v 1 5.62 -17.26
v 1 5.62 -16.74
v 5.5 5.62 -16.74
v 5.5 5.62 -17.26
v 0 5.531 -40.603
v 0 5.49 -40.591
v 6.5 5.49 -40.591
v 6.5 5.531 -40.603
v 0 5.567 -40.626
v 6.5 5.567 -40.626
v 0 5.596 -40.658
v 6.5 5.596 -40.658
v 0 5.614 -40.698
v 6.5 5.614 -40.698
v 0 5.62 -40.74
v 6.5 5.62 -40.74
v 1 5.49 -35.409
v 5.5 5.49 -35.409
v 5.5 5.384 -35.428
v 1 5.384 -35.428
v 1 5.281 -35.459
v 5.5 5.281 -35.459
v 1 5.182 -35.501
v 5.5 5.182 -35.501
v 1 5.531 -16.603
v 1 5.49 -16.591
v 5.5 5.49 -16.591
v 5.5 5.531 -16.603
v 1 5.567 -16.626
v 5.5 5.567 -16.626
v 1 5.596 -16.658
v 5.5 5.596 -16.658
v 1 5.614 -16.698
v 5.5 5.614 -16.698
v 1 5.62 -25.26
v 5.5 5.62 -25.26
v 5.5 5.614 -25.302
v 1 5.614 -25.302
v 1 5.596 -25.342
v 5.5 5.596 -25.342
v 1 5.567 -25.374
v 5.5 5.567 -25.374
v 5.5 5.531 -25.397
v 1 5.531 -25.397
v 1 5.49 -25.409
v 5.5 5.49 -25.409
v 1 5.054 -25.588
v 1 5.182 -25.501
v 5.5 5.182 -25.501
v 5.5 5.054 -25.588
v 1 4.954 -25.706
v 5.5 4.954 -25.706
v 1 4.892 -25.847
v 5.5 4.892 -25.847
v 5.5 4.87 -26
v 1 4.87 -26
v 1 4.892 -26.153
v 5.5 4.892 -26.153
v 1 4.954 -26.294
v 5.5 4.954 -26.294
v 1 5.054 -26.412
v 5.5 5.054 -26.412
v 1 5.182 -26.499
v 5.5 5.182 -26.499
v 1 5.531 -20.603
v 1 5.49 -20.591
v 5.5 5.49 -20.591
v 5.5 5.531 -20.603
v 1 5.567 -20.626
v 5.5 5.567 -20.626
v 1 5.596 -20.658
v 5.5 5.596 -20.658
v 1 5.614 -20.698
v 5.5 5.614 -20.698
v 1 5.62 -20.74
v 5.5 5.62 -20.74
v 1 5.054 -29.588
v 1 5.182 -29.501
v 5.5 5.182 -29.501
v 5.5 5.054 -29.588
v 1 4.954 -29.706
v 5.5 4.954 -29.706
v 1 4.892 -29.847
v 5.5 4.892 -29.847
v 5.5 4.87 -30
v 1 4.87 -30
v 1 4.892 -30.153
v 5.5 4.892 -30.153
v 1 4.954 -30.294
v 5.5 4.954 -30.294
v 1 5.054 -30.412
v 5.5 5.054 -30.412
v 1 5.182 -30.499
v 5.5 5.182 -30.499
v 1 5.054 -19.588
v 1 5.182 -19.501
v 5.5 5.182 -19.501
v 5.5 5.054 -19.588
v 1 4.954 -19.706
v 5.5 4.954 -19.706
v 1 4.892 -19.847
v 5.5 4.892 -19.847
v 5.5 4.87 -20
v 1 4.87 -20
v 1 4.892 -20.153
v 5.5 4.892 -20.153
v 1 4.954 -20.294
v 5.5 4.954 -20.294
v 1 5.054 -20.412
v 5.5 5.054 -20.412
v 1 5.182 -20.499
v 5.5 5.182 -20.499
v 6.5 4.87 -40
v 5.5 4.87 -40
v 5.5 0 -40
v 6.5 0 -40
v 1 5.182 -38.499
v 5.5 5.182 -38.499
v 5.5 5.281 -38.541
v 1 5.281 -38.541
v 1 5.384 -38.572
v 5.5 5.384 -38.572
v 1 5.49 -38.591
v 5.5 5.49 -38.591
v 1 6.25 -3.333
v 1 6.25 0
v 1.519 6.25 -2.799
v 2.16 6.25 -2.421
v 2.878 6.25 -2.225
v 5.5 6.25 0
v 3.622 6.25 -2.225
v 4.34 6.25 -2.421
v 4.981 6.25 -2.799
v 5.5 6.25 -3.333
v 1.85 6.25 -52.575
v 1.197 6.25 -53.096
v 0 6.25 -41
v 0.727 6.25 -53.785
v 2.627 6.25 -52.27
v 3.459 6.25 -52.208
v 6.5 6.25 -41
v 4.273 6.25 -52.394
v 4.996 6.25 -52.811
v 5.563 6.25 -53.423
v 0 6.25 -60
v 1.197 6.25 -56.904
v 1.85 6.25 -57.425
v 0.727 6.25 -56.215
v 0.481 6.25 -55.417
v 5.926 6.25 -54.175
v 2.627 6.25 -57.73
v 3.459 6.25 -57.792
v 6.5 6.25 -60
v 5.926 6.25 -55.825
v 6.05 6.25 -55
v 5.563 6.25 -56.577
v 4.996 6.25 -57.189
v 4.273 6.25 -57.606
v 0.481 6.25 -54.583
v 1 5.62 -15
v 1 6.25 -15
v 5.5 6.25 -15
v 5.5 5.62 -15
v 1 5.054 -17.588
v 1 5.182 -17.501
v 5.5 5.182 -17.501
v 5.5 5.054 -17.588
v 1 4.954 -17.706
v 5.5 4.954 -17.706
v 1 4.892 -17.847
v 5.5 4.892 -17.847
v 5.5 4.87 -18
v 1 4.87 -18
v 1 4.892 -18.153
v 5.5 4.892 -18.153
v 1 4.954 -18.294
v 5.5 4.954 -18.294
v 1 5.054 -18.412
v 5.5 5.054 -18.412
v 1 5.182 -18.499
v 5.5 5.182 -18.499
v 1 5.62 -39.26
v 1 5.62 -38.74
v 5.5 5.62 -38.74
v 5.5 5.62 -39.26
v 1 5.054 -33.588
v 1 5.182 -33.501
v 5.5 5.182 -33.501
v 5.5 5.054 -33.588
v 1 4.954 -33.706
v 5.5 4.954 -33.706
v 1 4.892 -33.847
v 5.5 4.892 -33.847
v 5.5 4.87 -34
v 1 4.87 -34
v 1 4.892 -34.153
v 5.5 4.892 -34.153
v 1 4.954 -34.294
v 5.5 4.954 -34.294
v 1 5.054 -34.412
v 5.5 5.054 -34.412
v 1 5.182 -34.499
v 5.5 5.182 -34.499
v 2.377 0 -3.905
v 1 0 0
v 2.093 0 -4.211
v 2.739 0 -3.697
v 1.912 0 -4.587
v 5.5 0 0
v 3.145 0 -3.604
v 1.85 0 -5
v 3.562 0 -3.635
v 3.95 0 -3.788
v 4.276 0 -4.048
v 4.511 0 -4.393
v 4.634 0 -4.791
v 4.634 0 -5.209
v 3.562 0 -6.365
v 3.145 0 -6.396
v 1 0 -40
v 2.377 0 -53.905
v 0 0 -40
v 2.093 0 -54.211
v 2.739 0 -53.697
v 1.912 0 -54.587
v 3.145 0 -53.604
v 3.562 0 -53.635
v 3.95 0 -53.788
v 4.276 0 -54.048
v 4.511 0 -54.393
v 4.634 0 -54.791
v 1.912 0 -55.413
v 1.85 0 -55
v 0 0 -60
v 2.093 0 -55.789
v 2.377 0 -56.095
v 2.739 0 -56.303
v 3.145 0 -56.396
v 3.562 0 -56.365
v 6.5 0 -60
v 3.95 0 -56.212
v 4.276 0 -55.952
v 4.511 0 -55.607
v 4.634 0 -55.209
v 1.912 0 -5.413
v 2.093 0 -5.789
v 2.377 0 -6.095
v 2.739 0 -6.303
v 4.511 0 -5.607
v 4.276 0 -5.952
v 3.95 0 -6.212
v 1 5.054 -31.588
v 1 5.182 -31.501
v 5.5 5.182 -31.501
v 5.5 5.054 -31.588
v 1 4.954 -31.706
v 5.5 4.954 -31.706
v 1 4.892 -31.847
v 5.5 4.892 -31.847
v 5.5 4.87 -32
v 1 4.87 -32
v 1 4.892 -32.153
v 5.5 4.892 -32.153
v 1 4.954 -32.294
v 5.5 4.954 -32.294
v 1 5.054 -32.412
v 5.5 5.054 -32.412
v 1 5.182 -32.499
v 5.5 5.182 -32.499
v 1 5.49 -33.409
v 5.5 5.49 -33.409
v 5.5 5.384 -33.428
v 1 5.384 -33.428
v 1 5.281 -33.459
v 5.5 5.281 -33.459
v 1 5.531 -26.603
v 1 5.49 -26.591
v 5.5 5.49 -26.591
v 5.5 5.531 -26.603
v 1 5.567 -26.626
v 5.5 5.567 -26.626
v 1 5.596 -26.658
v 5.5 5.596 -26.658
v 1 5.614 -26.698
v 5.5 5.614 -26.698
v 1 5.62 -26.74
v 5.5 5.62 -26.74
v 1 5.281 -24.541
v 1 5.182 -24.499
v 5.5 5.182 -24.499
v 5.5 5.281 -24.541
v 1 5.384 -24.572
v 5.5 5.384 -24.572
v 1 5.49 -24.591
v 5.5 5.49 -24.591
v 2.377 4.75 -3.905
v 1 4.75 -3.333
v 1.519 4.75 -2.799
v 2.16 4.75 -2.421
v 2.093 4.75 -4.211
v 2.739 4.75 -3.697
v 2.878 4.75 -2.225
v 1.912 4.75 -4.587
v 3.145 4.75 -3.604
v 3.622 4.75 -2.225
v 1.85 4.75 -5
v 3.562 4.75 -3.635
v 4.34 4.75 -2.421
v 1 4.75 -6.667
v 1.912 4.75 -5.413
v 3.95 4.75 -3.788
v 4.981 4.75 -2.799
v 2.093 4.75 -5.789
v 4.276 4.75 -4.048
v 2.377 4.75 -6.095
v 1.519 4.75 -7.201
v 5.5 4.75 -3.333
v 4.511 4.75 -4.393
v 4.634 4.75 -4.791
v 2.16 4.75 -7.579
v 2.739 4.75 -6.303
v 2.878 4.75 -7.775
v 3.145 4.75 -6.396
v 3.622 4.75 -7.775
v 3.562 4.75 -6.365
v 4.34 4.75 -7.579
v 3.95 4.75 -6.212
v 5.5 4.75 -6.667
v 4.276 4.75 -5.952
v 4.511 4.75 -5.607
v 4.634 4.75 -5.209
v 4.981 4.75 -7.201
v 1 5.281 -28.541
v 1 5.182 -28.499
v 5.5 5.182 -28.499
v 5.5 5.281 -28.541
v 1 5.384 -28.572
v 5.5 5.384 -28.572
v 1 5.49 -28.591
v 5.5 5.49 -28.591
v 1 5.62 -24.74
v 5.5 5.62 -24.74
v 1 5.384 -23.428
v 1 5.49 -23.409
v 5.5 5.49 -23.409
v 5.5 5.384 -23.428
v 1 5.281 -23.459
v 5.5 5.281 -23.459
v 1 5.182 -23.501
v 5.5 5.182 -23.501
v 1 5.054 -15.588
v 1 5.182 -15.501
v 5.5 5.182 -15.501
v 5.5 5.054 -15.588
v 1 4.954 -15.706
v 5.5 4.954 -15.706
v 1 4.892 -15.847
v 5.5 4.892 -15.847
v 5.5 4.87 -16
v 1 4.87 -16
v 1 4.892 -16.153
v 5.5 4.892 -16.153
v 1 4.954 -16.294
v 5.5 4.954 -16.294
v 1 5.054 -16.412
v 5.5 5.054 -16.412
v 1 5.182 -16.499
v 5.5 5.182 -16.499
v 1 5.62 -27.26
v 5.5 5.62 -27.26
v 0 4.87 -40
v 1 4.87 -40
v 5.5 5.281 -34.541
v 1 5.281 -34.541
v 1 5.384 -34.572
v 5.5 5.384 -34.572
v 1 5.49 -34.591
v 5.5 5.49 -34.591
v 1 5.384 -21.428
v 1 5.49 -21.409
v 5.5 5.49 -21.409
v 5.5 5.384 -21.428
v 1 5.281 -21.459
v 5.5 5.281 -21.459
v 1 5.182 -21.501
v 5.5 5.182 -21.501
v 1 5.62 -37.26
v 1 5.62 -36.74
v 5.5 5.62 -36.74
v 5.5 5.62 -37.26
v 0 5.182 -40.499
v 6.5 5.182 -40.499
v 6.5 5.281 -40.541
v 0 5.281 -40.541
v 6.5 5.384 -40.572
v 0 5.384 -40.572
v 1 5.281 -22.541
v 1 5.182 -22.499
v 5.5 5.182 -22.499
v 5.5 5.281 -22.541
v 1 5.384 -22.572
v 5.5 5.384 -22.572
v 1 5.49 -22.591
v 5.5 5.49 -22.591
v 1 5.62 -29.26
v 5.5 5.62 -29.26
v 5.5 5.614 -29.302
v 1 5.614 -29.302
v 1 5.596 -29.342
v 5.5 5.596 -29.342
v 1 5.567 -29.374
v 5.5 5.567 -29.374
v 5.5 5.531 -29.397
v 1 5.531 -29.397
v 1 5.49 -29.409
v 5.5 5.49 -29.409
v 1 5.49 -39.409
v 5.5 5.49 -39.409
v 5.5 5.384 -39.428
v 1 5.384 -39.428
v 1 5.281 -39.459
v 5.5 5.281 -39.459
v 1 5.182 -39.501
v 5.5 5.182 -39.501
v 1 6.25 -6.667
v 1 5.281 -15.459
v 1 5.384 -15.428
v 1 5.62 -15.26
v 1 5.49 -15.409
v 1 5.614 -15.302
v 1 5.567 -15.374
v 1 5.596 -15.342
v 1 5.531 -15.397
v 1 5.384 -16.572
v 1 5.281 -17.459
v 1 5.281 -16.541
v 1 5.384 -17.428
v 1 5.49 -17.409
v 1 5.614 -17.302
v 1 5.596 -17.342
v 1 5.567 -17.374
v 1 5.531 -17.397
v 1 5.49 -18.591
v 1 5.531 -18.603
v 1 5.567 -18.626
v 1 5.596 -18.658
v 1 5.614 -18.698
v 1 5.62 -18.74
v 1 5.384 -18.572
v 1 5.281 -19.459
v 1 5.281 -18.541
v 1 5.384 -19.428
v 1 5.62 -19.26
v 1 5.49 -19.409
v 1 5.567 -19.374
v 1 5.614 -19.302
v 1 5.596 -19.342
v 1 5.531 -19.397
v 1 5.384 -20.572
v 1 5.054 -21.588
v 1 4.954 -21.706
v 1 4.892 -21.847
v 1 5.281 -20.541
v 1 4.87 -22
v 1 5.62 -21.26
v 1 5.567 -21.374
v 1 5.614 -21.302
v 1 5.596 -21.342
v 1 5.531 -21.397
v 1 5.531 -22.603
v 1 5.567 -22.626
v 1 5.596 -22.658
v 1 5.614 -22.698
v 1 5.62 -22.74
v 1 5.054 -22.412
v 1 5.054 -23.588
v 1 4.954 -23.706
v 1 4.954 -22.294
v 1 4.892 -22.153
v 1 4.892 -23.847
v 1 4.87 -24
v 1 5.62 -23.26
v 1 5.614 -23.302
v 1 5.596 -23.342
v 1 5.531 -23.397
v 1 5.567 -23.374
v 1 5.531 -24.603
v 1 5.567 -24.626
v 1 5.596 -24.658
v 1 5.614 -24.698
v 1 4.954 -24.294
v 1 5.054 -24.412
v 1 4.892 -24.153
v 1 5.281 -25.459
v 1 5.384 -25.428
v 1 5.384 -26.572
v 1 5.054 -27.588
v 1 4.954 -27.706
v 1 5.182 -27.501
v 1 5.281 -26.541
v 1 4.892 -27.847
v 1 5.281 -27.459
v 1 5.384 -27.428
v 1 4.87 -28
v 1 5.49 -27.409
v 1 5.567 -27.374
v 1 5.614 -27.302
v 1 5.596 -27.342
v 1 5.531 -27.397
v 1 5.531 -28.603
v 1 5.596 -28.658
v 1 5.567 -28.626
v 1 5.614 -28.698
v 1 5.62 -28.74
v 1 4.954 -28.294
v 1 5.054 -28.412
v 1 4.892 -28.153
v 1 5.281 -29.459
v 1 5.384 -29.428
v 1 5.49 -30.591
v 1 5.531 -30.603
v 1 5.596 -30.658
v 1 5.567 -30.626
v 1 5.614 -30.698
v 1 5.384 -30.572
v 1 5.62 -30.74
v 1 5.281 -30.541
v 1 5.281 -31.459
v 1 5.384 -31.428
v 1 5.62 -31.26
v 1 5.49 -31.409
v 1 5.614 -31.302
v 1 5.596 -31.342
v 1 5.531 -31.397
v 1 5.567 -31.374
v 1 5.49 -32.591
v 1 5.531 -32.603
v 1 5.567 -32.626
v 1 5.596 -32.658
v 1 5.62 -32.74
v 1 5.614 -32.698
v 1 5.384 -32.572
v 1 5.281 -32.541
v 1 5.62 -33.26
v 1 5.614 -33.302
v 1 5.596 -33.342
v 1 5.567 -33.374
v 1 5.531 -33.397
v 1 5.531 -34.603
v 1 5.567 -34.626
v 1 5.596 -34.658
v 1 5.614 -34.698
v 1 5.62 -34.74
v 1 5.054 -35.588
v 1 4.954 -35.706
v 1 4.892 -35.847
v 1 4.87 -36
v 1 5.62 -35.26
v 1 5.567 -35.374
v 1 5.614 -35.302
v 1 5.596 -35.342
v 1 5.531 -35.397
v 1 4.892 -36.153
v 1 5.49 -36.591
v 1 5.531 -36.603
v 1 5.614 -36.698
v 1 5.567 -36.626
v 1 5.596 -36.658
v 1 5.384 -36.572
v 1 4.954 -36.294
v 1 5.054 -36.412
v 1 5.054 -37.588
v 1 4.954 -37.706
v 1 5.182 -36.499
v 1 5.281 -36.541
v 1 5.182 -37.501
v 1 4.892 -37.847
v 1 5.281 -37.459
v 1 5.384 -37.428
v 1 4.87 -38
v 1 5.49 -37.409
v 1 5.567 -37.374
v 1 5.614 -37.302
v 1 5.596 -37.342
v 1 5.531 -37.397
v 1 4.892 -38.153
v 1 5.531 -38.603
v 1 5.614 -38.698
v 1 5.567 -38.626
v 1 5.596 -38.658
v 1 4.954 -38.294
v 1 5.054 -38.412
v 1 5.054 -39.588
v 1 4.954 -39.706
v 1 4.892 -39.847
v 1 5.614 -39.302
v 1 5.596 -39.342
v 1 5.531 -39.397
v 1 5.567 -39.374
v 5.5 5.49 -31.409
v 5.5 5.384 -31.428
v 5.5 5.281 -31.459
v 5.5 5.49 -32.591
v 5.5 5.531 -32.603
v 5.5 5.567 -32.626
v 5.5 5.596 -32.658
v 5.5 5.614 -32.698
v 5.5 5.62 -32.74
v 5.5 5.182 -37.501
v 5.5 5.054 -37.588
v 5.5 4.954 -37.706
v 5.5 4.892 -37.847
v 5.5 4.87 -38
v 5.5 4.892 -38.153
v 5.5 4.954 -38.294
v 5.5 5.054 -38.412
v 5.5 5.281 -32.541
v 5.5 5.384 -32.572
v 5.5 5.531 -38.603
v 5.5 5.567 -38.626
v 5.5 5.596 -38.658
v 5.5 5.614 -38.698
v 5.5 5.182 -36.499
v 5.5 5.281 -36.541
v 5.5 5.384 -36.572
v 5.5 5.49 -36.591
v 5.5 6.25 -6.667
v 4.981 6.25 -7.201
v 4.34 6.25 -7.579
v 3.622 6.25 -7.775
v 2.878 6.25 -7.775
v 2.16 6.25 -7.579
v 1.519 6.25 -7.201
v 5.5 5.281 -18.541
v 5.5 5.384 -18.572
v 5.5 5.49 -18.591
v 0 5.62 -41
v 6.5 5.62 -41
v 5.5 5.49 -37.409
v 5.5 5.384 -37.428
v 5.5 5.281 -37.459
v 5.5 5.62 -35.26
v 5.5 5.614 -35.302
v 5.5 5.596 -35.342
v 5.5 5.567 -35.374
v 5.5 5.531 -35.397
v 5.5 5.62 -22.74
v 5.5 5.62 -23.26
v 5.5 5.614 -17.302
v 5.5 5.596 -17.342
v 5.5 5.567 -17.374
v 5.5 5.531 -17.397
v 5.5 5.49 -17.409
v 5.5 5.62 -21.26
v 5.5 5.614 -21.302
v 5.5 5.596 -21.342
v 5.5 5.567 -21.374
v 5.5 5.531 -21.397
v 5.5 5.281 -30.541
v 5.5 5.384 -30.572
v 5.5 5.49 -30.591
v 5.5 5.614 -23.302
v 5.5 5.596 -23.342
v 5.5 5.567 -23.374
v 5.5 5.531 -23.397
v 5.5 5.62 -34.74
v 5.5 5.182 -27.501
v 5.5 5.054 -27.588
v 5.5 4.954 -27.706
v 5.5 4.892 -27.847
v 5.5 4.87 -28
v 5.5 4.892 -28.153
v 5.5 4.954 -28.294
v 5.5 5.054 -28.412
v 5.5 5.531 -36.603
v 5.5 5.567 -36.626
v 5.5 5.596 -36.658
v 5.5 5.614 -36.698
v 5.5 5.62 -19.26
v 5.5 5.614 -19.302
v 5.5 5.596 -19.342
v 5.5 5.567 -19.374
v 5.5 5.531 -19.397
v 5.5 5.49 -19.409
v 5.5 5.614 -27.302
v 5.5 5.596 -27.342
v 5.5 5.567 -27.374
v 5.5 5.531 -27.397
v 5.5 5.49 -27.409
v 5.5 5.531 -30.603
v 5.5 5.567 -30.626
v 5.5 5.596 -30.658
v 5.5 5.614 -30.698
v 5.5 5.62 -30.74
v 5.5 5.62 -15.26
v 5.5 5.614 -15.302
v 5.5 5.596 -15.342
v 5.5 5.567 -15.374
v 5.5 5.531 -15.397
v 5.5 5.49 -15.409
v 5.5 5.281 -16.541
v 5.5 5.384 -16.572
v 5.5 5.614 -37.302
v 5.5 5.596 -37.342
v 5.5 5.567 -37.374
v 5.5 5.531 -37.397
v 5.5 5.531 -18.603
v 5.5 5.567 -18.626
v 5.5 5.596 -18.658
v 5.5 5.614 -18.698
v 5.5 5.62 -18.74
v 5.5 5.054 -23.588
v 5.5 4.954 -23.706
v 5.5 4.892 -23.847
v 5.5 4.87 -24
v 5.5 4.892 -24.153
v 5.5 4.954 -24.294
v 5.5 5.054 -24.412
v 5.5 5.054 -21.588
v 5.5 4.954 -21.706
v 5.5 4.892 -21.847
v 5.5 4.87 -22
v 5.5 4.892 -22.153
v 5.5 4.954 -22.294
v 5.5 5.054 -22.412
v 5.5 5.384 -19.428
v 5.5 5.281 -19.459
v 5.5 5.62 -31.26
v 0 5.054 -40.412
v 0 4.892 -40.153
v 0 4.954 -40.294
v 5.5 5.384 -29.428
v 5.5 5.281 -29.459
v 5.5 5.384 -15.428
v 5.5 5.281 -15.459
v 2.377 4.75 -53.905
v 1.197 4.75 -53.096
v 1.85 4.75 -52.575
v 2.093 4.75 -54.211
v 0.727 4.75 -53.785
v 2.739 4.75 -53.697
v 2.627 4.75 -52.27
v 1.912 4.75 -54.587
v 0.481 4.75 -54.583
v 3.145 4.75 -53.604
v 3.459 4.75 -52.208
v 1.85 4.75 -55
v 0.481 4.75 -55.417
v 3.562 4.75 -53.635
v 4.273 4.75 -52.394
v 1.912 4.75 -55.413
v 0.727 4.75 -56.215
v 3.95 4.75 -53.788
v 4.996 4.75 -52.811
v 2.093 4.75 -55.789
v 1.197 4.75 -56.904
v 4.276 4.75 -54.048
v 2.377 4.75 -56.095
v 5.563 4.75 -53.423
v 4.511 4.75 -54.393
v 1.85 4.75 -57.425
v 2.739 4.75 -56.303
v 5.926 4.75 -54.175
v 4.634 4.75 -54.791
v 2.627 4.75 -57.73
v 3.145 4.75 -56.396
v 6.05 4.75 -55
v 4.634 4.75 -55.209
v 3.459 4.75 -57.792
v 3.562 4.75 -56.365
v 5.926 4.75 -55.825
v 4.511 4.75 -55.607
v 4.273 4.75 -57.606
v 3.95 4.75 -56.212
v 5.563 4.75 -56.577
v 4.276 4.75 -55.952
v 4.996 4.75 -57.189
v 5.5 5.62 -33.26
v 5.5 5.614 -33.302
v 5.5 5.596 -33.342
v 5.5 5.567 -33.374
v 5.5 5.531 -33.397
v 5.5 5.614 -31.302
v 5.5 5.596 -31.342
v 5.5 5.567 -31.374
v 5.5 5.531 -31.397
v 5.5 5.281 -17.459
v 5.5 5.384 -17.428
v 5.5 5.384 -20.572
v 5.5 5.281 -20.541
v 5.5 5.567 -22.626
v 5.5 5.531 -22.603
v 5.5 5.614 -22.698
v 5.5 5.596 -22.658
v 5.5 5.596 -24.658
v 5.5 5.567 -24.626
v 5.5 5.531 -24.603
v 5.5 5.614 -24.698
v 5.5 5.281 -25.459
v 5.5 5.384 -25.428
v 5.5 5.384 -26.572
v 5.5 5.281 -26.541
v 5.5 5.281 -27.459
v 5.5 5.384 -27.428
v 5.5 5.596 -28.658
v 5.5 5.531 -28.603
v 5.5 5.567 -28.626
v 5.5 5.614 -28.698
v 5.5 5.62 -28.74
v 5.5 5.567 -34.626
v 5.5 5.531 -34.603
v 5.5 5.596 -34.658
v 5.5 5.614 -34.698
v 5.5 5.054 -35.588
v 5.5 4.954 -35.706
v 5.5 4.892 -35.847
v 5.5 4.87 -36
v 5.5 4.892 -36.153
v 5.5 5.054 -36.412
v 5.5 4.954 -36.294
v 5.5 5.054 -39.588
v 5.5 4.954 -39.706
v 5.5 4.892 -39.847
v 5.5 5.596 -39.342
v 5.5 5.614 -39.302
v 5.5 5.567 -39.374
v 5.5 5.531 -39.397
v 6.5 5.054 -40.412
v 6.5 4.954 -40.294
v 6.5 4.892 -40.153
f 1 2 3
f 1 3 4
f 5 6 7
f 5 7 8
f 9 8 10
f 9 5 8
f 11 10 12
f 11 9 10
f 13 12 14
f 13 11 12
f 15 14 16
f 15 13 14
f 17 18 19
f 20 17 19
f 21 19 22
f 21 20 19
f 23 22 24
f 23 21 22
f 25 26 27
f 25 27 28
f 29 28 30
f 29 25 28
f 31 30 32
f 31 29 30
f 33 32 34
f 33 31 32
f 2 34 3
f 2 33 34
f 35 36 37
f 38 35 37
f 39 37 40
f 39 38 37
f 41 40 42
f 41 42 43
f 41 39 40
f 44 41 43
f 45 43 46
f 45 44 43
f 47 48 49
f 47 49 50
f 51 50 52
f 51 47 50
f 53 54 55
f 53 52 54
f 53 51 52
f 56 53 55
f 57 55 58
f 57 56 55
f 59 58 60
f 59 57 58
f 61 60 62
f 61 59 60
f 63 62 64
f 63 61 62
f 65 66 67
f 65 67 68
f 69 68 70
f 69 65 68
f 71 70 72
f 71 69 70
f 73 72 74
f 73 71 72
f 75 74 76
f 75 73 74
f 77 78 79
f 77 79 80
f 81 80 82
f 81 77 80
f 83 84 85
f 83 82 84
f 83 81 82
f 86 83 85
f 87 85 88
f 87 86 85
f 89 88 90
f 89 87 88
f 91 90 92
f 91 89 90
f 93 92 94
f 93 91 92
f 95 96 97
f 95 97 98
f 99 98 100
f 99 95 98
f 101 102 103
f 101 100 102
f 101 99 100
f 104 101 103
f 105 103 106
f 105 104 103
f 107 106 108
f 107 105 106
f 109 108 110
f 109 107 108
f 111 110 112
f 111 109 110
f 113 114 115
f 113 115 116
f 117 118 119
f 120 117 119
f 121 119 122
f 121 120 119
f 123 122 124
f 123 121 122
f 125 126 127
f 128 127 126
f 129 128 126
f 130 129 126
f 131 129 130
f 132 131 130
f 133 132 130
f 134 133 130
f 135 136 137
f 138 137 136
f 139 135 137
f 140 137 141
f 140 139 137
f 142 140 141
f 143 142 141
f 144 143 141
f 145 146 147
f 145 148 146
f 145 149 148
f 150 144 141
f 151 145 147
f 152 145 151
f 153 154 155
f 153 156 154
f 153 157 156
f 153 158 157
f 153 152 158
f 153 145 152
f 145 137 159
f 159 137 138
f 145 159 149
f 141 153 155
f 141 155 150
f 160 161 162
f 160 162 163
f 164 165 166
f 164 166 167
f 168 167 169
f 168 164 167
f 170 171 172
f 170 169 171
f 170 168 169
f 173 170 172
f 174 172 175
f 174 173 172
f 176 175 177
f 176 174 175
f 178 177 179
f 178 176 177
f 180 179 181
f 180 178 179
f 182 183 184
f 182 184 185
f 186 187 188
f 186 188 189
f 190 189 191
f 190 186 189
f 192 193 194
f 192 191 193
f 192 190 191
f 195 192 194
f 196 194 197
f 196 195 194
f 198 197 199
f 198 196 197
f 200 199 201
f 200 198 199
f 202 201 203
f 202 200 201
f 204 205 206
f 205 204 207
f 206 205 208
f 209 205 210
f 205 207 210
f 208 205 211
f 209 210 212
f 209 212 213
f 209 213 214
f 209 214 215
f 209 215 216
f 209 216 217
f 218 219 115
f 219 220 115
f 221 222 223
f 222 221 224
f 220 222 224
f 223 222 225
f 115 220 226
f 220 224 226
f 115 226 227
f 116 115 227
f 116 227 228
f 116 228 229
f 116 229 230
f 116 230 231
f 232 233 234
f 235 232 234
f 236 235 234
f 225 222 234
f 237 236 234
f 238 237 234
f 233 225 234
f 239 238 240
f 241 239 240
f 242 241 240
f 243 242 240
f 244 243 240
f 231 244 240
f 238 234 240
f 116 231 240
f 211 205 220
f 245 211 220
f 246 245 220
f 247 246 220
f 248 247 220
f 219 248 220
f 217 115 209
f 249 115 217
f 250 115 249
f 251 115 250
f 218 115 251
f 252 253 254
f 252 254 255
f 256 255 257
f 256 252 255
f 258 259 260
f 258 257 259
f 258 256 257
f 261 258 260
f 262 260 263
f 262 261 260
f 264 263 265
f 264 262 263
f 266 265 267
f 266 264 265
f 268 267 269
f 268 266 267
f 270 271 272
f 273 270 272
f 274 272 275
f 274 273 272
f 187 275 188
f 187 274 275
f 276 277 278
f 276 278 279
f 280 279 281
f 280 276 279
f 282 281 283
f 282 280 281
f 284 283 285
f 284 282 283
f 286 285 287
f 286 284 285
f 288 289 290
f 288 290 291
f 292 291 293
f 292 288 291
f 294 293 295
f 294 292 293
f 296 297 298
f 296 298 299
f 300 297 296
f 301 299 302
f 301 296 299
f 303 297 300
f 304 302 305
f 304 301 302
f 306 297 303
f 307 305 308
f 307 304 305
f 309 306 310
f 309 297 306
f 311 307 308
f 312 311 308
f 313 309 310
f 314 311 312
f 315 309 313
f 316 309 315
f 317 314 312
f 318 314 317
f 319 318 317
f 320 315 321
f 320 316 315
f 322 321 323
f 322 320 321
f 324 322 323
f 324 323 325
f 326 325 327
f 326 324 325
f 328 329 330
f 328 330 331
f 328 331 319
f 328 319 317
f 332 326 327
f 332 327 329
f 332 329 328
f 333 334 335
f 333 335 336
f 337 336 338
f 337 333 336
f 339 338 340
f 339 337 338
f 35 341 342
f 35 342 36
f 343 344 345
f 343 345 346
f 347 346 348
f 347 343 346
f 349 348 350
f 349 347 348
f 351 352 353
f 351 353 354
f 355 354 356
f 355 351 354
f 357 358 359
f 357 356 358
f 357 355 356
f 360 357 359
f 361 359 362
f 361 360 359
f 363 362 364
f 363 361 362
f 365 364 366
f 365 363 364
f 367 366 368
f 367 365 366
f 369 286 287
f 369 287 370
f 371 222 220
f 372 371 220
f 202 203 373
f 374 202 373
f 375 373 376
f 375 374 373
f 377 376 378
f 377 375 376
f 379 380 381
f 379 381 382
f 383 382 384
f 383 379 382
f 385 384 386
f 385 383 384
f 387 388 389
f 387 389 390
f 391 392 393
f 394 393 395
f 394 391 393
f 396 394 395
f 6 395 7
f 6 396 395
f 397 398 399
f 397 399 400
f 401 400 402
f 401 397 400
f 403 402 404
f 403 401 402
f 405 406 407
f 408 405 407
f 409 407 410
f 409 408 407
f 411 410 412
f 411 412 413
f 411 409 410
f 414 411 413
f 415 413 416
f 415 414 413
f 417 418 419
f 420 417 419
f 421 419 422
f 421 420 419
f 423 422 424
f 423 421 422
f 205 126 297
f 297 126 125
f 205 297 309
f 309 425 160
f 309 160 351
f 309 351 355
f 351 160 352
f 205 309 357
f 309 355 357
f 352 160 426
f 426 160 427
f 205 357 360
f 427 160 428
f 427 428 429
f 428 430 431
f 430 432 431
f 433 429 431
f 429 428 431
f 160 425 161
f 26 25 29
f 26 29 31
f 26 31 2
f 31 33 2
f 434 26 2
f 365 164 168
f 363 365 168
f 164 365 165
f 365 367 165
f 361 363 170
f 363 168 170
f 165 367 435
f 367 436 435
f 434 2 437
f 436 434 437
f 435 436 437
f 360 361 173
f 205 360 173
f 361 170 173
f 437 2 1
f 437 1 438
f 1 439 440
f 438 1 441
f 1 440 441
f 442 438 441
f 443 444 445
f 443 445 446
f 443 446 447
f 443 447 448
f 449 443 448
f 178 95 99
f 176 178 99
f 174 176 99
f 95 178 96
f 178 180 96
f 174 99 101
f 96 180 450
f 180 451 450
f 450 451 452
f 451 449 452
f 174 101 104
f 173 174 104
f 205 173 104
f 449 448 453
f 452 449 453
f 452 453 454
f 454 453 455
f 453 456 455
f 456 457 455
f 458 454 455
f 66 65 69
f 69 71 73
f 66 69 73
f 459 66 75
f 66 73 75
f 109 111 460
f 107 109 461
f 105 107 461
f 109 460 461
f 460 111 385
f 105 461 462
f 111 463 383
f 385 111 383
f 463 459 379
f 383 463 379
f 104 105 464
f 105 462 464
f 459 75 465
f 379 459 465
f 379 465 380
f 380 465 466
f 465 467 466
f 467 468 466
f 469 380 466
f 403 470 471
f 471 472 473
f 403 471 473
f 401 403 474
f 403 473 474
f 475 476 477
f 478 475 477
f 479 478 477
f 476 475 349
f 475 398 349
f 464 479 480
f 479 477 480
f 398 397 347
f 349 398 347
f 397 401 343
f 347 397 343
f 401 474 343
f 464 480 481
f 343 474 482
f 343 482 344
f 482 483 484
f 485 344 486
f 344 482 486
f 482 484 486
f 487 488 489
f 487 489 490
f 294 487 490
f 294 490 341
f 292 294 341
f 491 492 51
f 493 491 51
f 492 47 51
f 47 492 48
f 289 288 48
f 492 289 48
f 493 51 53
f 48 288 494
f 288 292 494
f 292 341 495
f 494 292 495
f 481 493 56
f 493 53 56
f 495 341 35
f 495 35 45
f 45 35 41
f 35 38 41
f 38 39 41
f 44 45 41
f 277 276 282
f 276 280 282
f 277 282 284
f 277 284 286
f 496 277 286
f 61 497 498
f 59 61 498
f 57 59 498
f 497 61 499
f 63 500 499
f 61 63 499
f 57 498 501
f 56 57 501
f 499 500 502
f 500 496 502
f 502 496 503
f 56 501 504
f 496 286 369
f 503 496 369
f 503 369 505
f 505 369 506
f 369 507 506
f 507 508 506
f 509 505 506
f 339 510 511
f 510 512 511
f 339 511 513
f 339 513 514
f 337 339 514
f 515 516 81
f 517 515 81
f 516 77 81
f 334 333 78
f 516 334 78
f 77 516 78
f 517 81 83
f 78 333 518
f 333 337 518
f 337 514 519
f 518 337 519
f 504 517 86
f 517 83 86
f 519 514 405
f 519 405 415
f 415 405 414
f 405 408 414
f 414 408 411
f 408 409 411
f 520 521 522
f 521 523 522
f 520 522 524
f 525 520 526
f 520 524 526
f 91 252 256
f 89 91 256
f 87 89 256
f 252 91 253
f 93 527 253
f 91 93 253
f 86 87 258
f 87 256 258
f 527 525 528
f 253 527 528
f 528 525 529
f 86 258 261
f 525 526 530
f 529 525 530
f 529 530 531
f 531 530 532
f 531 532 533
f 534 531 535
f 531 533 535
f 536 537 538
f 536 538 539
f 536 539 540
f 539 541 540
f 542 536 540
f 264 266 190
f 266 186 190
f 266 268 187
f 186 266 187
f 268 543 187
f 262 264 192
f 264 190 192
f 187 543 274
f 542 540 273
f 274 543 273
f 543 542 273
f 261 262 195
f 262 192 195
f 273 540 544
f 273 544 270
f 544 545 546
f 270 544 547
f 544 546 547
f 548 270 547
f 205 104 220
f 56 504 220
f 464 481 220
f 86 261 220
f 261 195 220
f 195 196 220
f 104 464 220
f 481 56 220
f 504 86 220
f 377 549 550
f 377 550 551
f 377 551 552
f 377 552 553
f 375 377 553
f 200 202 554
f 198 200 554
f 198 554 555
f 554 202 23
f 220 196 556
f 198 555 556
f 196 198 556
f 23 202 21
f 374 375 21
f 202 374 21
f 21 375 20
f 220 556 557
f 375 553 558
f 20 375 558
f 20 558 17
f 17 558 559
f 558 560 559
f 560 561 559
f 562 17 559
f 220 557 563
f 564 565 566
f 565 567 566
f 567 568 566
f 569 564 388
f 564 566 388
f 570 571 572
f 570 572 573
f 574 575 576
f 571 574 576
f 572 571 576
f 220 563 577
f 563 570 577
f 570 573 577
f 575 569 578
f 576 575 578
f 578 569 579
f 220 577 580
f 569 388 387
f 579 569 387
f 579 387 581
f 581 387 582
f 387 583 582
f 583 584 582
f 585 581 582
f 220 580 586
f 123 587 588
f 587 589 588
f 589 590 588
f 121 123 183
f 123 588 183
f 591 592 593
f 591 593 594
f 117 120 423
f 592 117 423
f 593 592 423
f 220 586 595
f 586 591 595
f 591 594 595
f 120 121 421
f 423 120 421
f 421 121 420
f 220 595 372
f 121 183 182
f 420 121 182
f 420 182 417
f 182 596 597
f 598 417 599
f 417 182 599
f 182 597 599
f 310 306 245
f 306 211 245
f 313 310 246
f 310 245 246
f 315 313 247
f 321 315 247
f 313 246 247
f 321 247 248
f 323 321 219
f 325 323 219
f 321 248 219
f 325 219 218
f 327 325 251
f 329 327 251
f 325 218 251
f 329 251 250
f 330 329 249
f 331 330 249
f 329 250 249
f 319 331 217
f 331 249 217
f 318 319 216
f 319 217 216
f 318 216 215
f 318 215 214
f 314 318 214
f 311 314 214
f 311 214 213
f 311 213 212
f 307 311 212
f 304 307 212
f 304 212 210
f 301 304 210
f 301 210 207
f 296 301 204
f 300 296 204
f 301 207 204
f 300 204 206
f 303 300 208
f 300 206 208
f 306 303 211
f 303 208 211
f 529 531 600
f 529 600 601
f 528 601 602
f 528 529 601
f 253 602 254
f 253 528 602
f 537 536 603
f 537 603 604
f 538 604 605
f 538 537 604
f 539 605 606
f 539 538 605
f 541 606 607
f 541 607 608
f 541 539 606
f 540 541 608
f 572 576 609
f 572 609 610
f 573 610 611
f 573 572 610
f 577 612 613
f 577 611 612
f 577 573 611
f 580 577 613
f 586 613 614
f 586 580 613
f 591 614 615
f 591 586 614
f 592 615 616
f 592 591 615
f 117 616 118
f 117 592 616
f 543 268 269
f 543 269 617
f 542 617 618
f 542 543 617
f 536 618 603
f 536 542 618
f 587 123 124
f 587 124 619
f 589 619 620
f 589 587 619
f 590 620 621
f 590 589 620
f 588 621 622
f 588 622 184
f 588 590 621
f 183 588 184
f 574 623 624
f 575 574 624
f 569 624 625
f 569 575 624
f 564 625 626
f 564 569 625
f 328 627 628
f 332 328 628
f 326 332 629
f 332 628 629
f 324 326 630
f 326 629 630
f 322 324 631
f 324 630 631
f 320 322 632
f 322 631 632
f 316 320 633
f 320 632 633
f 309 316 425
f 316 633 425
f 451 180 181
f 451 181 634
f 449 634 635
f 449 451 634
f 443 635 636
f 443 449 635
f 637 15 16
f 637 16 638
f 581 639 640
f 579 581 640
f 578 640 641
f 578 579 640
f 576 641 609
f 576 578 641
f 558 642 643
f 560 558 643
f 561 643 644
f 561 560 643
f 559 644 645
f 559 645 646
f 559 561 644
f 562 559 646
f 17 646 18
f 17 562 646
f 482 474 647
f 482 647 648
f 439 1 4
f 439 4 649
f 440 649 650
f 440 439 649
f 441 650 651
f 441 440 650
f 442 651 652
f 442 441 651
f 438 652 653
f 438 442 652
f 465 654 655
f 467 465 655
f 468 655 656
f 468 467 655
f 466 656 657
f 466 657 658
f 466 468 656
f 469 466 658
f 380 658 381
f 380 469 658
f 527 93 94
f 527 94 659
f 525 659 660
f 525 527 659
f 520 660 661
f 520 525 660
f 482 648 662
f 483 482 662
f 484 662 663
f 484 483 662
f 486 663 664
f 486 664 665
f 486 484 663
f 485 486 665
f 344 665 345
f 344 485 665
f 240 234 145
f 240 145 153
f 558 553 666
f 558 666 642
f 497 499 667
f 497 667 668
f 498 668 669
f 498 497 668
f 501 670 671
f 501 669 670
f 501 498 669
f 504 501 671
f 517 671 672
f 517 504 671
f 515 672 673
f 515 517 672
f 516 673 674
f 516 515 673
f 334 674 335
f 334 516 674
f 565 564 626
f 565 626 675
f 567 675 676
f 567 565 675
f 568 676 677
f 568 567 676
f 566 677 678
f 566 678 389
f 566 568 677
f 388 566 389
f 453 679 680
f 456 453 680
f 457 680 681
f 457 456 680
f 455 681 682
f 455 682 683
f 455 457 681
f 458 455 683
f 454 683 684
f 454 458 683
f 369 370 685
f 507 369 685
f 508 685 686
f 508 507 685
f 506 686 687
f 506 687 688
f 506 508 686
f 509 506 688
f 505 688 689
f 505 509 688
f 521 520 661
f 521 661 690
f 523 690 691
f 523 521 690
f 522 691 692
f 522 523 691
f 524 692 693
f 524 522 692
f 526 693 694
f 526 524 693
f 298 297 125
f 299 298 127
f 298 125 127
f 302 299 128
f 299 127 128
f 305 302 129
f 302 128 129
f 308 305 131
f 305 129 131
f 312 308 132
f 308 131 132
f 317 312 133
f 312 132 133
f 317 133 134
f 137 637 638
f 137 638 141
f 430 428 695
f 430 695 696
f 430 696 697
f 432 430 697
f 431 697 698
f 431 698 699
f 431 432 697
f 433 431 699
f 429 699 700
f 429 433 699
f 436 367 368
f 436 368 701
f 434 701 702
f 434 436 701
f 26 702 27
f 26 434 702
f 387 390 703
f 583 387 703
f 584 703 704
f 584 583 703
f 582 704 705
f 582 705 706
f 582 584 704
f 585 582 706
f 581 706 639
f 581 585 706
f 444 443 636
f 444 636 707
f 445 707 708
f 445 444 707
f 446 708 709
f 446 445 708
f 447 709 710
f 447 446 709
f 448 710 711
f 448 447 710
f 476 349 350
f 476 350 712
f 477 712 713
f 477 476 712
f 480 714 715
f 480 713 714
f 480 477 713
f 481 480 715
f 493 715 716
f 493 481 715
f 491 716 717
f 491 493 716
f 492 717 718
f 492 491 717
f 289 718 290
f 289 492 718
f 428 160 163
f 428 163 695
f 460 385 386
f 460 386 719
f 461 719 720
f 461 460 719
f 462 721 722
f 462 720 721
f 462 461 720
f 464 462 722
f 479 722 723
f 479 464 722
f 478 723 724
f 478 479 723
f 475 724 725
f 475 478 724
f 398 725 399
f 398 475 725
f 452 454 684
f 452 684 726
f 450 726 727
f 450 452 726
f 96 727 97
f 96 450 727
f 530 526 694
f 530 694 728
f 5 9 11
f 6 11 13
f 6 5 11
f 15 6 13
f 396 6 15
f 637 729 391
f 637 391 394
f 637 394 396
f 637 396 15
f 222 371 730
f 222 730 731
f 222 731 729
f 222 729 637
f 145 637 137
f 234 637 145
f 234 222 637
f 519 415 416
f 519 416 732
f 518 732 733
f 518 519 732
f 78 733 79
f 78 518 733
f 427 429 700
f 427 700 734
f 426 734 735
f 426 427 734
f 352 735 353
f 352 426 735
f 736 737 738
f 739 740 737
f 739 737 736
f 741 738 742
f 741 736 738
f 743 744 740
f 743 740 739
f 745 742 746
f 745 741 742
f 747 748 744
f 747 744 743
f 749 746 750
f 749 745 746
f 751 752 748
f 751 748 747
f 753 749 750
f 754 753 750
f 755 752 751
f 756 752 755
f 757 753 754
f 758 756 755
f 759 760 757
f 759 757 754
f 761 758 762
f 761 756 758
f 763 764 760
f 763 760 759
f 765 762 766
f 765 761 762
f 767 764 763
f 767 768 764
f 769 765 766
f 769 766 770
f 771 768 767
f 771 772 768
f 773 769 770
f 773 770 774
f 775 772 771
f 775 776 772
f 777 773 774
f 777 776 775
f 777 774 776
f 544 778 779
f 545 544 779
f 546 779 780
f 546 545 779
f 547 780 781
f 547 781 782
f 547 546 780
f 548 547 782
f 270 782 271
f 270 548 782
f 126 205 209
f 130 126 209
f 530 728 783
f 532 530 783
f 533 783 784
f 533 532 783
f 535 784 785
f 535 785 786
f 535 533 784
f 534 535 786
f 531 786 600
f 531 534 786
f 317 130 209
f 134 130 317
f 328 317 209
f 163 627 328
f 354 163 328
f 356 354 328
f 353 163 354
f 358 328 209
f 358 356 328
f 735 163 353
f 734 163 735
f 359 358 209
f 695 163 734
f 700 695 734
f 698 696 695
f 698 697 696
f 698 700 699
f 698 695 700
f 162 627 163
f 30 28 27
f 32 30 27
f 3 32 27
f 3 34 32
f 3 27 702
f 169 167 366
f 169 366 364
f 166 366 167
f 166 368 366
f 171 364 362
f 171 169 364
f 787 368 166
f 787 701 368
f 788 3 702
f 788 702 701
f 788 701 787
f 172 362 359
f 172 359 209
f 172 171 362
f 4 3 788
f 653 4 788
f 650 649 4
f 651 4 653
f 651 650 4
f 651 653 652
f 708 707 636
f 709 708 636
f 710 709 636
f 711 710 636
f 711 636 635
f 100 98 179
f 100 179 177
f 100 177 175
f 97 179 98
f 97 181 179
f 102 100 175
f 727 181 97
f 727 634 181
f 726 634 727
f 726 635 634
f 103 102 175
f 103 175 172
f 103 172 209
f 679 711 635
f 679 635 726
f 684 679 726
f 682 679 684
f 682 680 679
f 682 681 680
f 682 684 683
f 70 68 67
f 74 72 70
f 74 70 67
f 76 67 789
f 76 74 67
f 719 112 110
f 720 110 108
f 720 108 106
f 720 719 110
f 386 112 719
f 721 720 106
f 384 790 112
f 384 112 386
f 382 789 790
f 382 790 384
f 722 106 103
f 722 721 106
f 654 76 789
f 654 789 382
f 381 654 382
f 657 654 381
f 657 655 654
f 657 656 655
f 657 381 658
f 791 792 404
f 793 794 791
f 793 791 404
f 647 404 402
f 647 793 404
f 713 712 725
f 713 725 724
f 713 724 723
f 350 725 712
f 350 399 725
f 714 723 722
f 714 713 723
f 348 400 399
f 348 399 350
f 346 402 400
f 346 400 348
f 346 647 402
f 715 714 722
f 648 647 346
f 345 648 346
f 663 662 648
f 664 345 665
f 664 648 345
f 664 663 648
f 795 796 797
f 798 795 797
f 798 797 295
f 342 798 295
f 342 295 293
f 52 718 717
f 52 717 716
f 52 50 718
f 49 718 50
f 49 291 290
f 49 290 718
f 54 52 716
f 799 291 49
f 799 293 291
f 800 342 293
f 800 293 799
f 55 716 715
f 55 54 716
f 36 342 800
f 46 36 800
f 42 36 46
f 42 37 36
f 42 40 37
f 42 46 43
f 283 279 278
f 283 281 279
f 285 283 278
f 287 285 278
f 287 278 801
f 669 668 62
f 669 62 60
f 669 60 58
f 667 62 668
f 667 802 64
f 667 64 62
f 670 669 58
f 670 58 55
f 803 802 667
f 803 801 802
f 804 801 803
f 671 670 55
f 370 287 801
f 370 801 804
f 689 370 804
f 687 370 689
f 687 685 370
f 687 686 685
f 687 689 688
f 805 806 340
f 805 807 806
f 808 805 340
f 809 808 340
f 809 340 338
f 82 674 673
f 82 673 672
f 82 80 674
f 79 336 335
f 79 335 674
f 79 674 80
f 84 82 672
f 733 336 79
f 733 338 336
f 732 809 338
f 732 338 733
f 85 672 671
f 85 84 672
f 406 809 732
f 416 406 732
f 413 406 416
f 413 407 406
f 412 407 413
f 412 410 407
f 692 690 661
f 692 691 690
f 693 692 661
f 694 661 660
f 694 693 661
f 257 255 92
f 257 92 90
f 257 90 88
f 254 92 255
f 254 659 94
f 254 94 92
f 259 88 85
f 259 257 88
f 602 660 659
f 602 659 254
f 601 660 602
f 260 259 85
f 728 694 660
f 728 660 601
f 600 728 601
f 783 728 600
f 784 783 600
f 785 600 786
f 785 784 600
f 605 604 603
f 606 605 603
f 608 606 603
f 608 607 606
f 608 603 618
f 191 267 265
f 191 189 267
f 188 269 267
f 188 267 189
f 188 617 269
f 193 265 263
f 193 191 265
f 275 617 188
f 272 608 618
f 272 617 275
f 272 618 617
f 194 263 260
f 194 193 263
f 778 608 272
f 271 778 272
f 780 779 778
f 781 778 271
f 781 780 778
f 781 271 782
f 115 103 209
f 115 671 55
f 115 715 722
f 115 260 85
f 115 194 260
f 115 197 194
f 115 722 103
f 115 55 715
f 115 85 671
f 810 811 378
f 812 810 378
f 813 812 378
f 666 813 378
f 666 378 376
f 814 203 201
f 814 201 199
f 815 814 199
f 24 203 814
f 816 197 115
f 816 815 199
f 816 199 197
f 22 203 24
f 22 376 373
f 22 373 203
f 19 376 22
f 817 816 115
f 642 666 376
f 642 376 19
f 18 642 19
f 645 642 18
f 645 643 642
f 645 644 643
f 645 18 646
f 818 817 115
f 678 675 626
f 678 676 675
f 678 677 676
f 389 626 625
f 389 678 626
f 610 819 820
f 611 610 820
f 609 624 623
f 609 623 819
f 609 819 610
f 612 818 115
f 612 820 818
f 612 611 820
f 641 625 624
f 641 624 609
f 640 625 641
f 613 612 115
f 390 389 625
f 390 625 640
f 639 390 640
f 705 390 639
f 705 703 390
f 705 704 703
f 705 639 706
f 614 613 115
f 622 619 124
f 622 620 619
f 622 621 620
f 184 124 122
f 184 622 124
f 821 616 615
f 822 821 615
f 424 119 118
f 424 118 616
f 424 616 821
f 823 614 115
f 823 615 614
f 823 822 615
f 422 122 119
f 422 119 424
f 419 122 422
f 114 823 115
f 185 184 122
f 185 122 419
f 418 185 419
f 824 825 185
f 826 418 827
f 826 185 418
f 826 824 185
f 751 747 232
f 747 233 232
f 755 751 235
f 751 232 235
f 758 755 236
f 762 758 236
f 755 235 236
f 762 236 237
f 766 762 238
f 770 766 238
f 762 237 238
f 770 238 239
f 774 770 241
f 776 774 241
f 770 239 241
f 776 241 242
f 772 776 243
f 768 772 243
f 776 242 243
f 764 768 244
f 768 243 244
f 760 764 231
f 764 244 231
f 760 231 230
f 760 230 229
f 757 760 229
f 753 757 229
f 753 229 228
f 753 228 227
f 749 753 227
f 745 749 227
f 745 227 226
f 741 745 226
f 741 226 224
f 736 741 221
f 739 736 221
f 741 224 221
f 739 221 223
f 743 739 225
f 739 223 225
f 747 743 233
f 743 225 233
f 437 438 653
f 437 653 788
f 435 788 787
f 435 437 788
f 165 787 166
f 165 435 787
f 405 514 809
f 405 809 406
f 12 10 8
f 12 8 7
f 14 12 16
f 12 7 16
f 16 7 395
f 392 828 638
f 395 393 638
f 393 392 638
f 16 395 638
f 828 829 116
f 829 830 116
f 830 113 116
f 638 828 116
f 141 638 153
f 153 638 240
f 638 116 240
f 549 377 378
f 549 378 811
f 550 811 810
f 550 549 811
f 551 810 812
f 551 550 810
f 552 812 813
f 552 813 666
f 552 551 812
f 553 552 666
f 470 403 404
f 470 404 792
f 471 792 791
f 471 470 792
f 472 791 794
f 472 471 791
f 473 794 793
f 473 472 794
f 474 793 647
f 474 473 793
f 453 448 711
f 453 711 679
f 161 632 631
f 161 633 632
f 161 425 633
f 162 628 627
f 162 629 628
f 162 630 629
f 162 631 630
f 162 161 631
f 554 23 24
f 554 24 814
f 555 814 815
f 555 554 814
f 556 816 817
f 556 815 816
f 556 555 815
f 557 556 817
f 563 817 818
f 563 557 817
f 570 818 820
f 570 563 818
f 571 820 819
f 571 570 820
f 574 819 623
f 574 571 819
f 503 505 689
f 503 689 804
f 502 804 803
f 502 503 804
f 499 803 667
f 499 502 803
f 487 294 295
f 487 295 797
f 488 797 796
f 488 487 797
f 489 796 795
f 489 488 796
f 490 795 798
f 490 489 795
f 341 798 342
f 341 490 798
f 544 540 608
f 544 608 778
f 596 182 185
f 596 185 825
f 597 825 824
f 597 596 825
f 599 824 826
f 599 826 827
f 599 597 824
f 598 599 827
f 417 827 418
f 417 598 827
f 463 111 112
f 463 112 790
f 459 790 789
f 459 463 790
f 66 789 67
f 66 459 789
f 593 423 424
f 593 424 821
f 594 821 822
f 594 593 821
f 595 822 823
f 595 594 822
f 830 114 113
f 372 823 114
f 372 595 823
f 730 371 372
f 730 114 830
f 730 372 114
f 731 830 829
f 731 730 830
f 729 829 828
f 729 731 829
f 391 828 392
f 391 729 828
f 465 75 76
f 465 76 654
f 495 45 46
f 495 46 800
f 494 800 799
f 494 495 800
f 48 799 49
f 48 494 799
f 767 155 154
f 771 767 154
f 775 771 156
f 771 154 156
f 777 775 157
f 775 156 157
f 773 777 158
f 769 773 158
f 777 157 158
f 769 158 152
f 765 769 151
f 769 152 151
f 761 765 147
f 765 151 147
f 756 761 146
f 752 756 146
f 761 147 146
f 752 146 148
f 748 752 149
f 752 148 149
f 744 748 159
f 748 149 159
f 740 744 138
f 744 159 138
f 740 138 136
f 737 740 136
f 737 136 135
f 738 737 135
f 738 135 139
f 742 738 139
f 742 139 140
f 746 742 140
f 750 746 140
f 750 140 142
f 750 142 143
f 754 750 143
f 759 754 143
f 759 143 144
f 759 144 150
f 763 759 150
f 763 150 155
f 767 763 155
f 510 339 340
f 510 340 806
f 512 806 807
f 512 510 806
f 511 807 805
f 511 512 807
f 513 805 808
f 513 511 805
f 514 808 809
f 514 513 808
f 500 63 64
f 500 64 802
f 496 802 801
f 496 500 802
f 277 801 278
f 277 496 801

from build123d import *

# Parameters (mm, degrees)
SKETCH1_W                        = 6.5
SKETCH1_H                        = 60
BOSS_EXTRUDE1_DEPTH              = 6.25
CUT_EXTRUDE3_DEPTH               = 61.673820549
LPATTERN1_COUNT                  = 12
LPATTERN1_PITCH                  = 2
CBORE_FOR_M1_6_SHCS1_D           = 2.8
CBORE_FOR_M1_6_SHCS1_CBORE_D     = 5.6
CBORE_FOR_M1_6_SHCS1_CBORE_DEPTH = 1.5
SKETCH6_W                        = 1
SKETCH6_H                        = 40
CUT_EXTRUDE2_DEPTH               = 61.673820549


with BuildPart() as part:
    # Sketch1 → Boss-Extrude1 (new body)
    with BuildSketch(Plane(origin=(0, 0, 0), x_dir=(1, 0, 0), z_dir=(0, 1, 0))):
        with Locations((3.25, 30)):
            Rectangle(SKETCH1_W, SKETCH1_H)
    extrude(amount=BOSS_EXTRUDE1_DEPTH)

    # Sketch9 → Cut-Extrude3 (cut, through all)
    with BuildSketch(Plane.ZY):
        with BuildLine():
            Line((-19, 6.25), (-15, 6.25))
            Line((-15, 6.25), (-15, 5.62))
            Line((-15, 5.62), (-15.259824575, 5.62))
            ThreePointArc((-15.259824575, 5.62), (-15.358731646, 5.582771412), (-15.408543109, 5.489565217))
            ThreePointArc((-15.408543109, 5.489565217), (-15.442388286, 5.331937846), (-15.501123596, 5.181797753))
            ThreePointArc((-15.501123596, 5.181797753), (-16, 4.87), (-16.498876404, 5.181797753))
            ThreePointArc((-16.498876404, 5.181797753), (-16.557611714, 5.331937846), (-16.591456891, 5.489565217))
            ThreePointArc((-16.591456891, 5.489565217), (-16.641268354, 5.582771412), (-16.740175425, 5.62))
            Line((-16.740175425, 5.62), (-17.259824575, 5.62))
            ThreePointArc((-17.259824575, 5.62), (-17.358731646, 5.582771412), (-17.408543109, 5.489565217))
            ThreePointArc((-17.408543109, 5.489565217), (-17.442388286, 5.331937846), (-17.501123596, 5.181797753))
            ThreePointArc((-17.501123596, 5.181797753), (-18, 4.87), (-18.498876404, 5.181797753))
            ThreePointArc((-18.498876404, 5.181797753), (-18.557611714, 5.331937846), (-18.591456891, 5.489565217))
            ThreePointArc((-18.591456891, 5.489565217), (-18.641268354, 5.582771412), (-18.740175425, 5.62))
            Line((-18.740175425, 5.62), (-19, 5.62))
            Line((-19, 5.62), (-19, 6.25))
        make_face()
    cut_extrude3 = extrude(amount=-CUT_EXTRUDE3_DEPTH, mode=Mode.SUBTRACT)

    # LPattern1: Cut-Extrude3 ×12
    with Locations(*[(0, 0, -i * LPATTERN1_PITCH) for i in range(1, LPATTERN1_COUNT)]):
        add(cut_extrude3, mode=Mode.SUBTRACT)

    # CBORE for M1.6 SHCS1 (through all)
    with Locations(Plane(origin=(0, 6.25, 0), x_dir=(1, 0, 0), z_dir=(0, 1, 0))):
        with Locations((3.25, 55), (3.25, 5)):
            CounterBoreHole(CBORE_FOR_M1_6_SHCS1_D / 2, CBORE_FOR_M1_6_SHCS1_CBORE_D / 2, CBORE_FOR_M1_6_SHCS1_CBORE_DEPTH)

    # Sketch6 → Cut-Extrude2 (cut, through all)
    with BuildSketch(Plane(origin=(0, 6.25, 0), x_dir=(1, 0, 0), z_dir=(0, 1, 0))):
        with Locations((6, 20)):
            Rectangle(SKETCH6_W, SKETCH6_H)
        with Locations((0.5, 20)):
            Rectangle(SKETCH6_W, SKETCH6_H)
    extrude(amount=-CUT_EXTRUDE2_DEPTH, mode=Mode.SUBTRACT)


solid = part.part
